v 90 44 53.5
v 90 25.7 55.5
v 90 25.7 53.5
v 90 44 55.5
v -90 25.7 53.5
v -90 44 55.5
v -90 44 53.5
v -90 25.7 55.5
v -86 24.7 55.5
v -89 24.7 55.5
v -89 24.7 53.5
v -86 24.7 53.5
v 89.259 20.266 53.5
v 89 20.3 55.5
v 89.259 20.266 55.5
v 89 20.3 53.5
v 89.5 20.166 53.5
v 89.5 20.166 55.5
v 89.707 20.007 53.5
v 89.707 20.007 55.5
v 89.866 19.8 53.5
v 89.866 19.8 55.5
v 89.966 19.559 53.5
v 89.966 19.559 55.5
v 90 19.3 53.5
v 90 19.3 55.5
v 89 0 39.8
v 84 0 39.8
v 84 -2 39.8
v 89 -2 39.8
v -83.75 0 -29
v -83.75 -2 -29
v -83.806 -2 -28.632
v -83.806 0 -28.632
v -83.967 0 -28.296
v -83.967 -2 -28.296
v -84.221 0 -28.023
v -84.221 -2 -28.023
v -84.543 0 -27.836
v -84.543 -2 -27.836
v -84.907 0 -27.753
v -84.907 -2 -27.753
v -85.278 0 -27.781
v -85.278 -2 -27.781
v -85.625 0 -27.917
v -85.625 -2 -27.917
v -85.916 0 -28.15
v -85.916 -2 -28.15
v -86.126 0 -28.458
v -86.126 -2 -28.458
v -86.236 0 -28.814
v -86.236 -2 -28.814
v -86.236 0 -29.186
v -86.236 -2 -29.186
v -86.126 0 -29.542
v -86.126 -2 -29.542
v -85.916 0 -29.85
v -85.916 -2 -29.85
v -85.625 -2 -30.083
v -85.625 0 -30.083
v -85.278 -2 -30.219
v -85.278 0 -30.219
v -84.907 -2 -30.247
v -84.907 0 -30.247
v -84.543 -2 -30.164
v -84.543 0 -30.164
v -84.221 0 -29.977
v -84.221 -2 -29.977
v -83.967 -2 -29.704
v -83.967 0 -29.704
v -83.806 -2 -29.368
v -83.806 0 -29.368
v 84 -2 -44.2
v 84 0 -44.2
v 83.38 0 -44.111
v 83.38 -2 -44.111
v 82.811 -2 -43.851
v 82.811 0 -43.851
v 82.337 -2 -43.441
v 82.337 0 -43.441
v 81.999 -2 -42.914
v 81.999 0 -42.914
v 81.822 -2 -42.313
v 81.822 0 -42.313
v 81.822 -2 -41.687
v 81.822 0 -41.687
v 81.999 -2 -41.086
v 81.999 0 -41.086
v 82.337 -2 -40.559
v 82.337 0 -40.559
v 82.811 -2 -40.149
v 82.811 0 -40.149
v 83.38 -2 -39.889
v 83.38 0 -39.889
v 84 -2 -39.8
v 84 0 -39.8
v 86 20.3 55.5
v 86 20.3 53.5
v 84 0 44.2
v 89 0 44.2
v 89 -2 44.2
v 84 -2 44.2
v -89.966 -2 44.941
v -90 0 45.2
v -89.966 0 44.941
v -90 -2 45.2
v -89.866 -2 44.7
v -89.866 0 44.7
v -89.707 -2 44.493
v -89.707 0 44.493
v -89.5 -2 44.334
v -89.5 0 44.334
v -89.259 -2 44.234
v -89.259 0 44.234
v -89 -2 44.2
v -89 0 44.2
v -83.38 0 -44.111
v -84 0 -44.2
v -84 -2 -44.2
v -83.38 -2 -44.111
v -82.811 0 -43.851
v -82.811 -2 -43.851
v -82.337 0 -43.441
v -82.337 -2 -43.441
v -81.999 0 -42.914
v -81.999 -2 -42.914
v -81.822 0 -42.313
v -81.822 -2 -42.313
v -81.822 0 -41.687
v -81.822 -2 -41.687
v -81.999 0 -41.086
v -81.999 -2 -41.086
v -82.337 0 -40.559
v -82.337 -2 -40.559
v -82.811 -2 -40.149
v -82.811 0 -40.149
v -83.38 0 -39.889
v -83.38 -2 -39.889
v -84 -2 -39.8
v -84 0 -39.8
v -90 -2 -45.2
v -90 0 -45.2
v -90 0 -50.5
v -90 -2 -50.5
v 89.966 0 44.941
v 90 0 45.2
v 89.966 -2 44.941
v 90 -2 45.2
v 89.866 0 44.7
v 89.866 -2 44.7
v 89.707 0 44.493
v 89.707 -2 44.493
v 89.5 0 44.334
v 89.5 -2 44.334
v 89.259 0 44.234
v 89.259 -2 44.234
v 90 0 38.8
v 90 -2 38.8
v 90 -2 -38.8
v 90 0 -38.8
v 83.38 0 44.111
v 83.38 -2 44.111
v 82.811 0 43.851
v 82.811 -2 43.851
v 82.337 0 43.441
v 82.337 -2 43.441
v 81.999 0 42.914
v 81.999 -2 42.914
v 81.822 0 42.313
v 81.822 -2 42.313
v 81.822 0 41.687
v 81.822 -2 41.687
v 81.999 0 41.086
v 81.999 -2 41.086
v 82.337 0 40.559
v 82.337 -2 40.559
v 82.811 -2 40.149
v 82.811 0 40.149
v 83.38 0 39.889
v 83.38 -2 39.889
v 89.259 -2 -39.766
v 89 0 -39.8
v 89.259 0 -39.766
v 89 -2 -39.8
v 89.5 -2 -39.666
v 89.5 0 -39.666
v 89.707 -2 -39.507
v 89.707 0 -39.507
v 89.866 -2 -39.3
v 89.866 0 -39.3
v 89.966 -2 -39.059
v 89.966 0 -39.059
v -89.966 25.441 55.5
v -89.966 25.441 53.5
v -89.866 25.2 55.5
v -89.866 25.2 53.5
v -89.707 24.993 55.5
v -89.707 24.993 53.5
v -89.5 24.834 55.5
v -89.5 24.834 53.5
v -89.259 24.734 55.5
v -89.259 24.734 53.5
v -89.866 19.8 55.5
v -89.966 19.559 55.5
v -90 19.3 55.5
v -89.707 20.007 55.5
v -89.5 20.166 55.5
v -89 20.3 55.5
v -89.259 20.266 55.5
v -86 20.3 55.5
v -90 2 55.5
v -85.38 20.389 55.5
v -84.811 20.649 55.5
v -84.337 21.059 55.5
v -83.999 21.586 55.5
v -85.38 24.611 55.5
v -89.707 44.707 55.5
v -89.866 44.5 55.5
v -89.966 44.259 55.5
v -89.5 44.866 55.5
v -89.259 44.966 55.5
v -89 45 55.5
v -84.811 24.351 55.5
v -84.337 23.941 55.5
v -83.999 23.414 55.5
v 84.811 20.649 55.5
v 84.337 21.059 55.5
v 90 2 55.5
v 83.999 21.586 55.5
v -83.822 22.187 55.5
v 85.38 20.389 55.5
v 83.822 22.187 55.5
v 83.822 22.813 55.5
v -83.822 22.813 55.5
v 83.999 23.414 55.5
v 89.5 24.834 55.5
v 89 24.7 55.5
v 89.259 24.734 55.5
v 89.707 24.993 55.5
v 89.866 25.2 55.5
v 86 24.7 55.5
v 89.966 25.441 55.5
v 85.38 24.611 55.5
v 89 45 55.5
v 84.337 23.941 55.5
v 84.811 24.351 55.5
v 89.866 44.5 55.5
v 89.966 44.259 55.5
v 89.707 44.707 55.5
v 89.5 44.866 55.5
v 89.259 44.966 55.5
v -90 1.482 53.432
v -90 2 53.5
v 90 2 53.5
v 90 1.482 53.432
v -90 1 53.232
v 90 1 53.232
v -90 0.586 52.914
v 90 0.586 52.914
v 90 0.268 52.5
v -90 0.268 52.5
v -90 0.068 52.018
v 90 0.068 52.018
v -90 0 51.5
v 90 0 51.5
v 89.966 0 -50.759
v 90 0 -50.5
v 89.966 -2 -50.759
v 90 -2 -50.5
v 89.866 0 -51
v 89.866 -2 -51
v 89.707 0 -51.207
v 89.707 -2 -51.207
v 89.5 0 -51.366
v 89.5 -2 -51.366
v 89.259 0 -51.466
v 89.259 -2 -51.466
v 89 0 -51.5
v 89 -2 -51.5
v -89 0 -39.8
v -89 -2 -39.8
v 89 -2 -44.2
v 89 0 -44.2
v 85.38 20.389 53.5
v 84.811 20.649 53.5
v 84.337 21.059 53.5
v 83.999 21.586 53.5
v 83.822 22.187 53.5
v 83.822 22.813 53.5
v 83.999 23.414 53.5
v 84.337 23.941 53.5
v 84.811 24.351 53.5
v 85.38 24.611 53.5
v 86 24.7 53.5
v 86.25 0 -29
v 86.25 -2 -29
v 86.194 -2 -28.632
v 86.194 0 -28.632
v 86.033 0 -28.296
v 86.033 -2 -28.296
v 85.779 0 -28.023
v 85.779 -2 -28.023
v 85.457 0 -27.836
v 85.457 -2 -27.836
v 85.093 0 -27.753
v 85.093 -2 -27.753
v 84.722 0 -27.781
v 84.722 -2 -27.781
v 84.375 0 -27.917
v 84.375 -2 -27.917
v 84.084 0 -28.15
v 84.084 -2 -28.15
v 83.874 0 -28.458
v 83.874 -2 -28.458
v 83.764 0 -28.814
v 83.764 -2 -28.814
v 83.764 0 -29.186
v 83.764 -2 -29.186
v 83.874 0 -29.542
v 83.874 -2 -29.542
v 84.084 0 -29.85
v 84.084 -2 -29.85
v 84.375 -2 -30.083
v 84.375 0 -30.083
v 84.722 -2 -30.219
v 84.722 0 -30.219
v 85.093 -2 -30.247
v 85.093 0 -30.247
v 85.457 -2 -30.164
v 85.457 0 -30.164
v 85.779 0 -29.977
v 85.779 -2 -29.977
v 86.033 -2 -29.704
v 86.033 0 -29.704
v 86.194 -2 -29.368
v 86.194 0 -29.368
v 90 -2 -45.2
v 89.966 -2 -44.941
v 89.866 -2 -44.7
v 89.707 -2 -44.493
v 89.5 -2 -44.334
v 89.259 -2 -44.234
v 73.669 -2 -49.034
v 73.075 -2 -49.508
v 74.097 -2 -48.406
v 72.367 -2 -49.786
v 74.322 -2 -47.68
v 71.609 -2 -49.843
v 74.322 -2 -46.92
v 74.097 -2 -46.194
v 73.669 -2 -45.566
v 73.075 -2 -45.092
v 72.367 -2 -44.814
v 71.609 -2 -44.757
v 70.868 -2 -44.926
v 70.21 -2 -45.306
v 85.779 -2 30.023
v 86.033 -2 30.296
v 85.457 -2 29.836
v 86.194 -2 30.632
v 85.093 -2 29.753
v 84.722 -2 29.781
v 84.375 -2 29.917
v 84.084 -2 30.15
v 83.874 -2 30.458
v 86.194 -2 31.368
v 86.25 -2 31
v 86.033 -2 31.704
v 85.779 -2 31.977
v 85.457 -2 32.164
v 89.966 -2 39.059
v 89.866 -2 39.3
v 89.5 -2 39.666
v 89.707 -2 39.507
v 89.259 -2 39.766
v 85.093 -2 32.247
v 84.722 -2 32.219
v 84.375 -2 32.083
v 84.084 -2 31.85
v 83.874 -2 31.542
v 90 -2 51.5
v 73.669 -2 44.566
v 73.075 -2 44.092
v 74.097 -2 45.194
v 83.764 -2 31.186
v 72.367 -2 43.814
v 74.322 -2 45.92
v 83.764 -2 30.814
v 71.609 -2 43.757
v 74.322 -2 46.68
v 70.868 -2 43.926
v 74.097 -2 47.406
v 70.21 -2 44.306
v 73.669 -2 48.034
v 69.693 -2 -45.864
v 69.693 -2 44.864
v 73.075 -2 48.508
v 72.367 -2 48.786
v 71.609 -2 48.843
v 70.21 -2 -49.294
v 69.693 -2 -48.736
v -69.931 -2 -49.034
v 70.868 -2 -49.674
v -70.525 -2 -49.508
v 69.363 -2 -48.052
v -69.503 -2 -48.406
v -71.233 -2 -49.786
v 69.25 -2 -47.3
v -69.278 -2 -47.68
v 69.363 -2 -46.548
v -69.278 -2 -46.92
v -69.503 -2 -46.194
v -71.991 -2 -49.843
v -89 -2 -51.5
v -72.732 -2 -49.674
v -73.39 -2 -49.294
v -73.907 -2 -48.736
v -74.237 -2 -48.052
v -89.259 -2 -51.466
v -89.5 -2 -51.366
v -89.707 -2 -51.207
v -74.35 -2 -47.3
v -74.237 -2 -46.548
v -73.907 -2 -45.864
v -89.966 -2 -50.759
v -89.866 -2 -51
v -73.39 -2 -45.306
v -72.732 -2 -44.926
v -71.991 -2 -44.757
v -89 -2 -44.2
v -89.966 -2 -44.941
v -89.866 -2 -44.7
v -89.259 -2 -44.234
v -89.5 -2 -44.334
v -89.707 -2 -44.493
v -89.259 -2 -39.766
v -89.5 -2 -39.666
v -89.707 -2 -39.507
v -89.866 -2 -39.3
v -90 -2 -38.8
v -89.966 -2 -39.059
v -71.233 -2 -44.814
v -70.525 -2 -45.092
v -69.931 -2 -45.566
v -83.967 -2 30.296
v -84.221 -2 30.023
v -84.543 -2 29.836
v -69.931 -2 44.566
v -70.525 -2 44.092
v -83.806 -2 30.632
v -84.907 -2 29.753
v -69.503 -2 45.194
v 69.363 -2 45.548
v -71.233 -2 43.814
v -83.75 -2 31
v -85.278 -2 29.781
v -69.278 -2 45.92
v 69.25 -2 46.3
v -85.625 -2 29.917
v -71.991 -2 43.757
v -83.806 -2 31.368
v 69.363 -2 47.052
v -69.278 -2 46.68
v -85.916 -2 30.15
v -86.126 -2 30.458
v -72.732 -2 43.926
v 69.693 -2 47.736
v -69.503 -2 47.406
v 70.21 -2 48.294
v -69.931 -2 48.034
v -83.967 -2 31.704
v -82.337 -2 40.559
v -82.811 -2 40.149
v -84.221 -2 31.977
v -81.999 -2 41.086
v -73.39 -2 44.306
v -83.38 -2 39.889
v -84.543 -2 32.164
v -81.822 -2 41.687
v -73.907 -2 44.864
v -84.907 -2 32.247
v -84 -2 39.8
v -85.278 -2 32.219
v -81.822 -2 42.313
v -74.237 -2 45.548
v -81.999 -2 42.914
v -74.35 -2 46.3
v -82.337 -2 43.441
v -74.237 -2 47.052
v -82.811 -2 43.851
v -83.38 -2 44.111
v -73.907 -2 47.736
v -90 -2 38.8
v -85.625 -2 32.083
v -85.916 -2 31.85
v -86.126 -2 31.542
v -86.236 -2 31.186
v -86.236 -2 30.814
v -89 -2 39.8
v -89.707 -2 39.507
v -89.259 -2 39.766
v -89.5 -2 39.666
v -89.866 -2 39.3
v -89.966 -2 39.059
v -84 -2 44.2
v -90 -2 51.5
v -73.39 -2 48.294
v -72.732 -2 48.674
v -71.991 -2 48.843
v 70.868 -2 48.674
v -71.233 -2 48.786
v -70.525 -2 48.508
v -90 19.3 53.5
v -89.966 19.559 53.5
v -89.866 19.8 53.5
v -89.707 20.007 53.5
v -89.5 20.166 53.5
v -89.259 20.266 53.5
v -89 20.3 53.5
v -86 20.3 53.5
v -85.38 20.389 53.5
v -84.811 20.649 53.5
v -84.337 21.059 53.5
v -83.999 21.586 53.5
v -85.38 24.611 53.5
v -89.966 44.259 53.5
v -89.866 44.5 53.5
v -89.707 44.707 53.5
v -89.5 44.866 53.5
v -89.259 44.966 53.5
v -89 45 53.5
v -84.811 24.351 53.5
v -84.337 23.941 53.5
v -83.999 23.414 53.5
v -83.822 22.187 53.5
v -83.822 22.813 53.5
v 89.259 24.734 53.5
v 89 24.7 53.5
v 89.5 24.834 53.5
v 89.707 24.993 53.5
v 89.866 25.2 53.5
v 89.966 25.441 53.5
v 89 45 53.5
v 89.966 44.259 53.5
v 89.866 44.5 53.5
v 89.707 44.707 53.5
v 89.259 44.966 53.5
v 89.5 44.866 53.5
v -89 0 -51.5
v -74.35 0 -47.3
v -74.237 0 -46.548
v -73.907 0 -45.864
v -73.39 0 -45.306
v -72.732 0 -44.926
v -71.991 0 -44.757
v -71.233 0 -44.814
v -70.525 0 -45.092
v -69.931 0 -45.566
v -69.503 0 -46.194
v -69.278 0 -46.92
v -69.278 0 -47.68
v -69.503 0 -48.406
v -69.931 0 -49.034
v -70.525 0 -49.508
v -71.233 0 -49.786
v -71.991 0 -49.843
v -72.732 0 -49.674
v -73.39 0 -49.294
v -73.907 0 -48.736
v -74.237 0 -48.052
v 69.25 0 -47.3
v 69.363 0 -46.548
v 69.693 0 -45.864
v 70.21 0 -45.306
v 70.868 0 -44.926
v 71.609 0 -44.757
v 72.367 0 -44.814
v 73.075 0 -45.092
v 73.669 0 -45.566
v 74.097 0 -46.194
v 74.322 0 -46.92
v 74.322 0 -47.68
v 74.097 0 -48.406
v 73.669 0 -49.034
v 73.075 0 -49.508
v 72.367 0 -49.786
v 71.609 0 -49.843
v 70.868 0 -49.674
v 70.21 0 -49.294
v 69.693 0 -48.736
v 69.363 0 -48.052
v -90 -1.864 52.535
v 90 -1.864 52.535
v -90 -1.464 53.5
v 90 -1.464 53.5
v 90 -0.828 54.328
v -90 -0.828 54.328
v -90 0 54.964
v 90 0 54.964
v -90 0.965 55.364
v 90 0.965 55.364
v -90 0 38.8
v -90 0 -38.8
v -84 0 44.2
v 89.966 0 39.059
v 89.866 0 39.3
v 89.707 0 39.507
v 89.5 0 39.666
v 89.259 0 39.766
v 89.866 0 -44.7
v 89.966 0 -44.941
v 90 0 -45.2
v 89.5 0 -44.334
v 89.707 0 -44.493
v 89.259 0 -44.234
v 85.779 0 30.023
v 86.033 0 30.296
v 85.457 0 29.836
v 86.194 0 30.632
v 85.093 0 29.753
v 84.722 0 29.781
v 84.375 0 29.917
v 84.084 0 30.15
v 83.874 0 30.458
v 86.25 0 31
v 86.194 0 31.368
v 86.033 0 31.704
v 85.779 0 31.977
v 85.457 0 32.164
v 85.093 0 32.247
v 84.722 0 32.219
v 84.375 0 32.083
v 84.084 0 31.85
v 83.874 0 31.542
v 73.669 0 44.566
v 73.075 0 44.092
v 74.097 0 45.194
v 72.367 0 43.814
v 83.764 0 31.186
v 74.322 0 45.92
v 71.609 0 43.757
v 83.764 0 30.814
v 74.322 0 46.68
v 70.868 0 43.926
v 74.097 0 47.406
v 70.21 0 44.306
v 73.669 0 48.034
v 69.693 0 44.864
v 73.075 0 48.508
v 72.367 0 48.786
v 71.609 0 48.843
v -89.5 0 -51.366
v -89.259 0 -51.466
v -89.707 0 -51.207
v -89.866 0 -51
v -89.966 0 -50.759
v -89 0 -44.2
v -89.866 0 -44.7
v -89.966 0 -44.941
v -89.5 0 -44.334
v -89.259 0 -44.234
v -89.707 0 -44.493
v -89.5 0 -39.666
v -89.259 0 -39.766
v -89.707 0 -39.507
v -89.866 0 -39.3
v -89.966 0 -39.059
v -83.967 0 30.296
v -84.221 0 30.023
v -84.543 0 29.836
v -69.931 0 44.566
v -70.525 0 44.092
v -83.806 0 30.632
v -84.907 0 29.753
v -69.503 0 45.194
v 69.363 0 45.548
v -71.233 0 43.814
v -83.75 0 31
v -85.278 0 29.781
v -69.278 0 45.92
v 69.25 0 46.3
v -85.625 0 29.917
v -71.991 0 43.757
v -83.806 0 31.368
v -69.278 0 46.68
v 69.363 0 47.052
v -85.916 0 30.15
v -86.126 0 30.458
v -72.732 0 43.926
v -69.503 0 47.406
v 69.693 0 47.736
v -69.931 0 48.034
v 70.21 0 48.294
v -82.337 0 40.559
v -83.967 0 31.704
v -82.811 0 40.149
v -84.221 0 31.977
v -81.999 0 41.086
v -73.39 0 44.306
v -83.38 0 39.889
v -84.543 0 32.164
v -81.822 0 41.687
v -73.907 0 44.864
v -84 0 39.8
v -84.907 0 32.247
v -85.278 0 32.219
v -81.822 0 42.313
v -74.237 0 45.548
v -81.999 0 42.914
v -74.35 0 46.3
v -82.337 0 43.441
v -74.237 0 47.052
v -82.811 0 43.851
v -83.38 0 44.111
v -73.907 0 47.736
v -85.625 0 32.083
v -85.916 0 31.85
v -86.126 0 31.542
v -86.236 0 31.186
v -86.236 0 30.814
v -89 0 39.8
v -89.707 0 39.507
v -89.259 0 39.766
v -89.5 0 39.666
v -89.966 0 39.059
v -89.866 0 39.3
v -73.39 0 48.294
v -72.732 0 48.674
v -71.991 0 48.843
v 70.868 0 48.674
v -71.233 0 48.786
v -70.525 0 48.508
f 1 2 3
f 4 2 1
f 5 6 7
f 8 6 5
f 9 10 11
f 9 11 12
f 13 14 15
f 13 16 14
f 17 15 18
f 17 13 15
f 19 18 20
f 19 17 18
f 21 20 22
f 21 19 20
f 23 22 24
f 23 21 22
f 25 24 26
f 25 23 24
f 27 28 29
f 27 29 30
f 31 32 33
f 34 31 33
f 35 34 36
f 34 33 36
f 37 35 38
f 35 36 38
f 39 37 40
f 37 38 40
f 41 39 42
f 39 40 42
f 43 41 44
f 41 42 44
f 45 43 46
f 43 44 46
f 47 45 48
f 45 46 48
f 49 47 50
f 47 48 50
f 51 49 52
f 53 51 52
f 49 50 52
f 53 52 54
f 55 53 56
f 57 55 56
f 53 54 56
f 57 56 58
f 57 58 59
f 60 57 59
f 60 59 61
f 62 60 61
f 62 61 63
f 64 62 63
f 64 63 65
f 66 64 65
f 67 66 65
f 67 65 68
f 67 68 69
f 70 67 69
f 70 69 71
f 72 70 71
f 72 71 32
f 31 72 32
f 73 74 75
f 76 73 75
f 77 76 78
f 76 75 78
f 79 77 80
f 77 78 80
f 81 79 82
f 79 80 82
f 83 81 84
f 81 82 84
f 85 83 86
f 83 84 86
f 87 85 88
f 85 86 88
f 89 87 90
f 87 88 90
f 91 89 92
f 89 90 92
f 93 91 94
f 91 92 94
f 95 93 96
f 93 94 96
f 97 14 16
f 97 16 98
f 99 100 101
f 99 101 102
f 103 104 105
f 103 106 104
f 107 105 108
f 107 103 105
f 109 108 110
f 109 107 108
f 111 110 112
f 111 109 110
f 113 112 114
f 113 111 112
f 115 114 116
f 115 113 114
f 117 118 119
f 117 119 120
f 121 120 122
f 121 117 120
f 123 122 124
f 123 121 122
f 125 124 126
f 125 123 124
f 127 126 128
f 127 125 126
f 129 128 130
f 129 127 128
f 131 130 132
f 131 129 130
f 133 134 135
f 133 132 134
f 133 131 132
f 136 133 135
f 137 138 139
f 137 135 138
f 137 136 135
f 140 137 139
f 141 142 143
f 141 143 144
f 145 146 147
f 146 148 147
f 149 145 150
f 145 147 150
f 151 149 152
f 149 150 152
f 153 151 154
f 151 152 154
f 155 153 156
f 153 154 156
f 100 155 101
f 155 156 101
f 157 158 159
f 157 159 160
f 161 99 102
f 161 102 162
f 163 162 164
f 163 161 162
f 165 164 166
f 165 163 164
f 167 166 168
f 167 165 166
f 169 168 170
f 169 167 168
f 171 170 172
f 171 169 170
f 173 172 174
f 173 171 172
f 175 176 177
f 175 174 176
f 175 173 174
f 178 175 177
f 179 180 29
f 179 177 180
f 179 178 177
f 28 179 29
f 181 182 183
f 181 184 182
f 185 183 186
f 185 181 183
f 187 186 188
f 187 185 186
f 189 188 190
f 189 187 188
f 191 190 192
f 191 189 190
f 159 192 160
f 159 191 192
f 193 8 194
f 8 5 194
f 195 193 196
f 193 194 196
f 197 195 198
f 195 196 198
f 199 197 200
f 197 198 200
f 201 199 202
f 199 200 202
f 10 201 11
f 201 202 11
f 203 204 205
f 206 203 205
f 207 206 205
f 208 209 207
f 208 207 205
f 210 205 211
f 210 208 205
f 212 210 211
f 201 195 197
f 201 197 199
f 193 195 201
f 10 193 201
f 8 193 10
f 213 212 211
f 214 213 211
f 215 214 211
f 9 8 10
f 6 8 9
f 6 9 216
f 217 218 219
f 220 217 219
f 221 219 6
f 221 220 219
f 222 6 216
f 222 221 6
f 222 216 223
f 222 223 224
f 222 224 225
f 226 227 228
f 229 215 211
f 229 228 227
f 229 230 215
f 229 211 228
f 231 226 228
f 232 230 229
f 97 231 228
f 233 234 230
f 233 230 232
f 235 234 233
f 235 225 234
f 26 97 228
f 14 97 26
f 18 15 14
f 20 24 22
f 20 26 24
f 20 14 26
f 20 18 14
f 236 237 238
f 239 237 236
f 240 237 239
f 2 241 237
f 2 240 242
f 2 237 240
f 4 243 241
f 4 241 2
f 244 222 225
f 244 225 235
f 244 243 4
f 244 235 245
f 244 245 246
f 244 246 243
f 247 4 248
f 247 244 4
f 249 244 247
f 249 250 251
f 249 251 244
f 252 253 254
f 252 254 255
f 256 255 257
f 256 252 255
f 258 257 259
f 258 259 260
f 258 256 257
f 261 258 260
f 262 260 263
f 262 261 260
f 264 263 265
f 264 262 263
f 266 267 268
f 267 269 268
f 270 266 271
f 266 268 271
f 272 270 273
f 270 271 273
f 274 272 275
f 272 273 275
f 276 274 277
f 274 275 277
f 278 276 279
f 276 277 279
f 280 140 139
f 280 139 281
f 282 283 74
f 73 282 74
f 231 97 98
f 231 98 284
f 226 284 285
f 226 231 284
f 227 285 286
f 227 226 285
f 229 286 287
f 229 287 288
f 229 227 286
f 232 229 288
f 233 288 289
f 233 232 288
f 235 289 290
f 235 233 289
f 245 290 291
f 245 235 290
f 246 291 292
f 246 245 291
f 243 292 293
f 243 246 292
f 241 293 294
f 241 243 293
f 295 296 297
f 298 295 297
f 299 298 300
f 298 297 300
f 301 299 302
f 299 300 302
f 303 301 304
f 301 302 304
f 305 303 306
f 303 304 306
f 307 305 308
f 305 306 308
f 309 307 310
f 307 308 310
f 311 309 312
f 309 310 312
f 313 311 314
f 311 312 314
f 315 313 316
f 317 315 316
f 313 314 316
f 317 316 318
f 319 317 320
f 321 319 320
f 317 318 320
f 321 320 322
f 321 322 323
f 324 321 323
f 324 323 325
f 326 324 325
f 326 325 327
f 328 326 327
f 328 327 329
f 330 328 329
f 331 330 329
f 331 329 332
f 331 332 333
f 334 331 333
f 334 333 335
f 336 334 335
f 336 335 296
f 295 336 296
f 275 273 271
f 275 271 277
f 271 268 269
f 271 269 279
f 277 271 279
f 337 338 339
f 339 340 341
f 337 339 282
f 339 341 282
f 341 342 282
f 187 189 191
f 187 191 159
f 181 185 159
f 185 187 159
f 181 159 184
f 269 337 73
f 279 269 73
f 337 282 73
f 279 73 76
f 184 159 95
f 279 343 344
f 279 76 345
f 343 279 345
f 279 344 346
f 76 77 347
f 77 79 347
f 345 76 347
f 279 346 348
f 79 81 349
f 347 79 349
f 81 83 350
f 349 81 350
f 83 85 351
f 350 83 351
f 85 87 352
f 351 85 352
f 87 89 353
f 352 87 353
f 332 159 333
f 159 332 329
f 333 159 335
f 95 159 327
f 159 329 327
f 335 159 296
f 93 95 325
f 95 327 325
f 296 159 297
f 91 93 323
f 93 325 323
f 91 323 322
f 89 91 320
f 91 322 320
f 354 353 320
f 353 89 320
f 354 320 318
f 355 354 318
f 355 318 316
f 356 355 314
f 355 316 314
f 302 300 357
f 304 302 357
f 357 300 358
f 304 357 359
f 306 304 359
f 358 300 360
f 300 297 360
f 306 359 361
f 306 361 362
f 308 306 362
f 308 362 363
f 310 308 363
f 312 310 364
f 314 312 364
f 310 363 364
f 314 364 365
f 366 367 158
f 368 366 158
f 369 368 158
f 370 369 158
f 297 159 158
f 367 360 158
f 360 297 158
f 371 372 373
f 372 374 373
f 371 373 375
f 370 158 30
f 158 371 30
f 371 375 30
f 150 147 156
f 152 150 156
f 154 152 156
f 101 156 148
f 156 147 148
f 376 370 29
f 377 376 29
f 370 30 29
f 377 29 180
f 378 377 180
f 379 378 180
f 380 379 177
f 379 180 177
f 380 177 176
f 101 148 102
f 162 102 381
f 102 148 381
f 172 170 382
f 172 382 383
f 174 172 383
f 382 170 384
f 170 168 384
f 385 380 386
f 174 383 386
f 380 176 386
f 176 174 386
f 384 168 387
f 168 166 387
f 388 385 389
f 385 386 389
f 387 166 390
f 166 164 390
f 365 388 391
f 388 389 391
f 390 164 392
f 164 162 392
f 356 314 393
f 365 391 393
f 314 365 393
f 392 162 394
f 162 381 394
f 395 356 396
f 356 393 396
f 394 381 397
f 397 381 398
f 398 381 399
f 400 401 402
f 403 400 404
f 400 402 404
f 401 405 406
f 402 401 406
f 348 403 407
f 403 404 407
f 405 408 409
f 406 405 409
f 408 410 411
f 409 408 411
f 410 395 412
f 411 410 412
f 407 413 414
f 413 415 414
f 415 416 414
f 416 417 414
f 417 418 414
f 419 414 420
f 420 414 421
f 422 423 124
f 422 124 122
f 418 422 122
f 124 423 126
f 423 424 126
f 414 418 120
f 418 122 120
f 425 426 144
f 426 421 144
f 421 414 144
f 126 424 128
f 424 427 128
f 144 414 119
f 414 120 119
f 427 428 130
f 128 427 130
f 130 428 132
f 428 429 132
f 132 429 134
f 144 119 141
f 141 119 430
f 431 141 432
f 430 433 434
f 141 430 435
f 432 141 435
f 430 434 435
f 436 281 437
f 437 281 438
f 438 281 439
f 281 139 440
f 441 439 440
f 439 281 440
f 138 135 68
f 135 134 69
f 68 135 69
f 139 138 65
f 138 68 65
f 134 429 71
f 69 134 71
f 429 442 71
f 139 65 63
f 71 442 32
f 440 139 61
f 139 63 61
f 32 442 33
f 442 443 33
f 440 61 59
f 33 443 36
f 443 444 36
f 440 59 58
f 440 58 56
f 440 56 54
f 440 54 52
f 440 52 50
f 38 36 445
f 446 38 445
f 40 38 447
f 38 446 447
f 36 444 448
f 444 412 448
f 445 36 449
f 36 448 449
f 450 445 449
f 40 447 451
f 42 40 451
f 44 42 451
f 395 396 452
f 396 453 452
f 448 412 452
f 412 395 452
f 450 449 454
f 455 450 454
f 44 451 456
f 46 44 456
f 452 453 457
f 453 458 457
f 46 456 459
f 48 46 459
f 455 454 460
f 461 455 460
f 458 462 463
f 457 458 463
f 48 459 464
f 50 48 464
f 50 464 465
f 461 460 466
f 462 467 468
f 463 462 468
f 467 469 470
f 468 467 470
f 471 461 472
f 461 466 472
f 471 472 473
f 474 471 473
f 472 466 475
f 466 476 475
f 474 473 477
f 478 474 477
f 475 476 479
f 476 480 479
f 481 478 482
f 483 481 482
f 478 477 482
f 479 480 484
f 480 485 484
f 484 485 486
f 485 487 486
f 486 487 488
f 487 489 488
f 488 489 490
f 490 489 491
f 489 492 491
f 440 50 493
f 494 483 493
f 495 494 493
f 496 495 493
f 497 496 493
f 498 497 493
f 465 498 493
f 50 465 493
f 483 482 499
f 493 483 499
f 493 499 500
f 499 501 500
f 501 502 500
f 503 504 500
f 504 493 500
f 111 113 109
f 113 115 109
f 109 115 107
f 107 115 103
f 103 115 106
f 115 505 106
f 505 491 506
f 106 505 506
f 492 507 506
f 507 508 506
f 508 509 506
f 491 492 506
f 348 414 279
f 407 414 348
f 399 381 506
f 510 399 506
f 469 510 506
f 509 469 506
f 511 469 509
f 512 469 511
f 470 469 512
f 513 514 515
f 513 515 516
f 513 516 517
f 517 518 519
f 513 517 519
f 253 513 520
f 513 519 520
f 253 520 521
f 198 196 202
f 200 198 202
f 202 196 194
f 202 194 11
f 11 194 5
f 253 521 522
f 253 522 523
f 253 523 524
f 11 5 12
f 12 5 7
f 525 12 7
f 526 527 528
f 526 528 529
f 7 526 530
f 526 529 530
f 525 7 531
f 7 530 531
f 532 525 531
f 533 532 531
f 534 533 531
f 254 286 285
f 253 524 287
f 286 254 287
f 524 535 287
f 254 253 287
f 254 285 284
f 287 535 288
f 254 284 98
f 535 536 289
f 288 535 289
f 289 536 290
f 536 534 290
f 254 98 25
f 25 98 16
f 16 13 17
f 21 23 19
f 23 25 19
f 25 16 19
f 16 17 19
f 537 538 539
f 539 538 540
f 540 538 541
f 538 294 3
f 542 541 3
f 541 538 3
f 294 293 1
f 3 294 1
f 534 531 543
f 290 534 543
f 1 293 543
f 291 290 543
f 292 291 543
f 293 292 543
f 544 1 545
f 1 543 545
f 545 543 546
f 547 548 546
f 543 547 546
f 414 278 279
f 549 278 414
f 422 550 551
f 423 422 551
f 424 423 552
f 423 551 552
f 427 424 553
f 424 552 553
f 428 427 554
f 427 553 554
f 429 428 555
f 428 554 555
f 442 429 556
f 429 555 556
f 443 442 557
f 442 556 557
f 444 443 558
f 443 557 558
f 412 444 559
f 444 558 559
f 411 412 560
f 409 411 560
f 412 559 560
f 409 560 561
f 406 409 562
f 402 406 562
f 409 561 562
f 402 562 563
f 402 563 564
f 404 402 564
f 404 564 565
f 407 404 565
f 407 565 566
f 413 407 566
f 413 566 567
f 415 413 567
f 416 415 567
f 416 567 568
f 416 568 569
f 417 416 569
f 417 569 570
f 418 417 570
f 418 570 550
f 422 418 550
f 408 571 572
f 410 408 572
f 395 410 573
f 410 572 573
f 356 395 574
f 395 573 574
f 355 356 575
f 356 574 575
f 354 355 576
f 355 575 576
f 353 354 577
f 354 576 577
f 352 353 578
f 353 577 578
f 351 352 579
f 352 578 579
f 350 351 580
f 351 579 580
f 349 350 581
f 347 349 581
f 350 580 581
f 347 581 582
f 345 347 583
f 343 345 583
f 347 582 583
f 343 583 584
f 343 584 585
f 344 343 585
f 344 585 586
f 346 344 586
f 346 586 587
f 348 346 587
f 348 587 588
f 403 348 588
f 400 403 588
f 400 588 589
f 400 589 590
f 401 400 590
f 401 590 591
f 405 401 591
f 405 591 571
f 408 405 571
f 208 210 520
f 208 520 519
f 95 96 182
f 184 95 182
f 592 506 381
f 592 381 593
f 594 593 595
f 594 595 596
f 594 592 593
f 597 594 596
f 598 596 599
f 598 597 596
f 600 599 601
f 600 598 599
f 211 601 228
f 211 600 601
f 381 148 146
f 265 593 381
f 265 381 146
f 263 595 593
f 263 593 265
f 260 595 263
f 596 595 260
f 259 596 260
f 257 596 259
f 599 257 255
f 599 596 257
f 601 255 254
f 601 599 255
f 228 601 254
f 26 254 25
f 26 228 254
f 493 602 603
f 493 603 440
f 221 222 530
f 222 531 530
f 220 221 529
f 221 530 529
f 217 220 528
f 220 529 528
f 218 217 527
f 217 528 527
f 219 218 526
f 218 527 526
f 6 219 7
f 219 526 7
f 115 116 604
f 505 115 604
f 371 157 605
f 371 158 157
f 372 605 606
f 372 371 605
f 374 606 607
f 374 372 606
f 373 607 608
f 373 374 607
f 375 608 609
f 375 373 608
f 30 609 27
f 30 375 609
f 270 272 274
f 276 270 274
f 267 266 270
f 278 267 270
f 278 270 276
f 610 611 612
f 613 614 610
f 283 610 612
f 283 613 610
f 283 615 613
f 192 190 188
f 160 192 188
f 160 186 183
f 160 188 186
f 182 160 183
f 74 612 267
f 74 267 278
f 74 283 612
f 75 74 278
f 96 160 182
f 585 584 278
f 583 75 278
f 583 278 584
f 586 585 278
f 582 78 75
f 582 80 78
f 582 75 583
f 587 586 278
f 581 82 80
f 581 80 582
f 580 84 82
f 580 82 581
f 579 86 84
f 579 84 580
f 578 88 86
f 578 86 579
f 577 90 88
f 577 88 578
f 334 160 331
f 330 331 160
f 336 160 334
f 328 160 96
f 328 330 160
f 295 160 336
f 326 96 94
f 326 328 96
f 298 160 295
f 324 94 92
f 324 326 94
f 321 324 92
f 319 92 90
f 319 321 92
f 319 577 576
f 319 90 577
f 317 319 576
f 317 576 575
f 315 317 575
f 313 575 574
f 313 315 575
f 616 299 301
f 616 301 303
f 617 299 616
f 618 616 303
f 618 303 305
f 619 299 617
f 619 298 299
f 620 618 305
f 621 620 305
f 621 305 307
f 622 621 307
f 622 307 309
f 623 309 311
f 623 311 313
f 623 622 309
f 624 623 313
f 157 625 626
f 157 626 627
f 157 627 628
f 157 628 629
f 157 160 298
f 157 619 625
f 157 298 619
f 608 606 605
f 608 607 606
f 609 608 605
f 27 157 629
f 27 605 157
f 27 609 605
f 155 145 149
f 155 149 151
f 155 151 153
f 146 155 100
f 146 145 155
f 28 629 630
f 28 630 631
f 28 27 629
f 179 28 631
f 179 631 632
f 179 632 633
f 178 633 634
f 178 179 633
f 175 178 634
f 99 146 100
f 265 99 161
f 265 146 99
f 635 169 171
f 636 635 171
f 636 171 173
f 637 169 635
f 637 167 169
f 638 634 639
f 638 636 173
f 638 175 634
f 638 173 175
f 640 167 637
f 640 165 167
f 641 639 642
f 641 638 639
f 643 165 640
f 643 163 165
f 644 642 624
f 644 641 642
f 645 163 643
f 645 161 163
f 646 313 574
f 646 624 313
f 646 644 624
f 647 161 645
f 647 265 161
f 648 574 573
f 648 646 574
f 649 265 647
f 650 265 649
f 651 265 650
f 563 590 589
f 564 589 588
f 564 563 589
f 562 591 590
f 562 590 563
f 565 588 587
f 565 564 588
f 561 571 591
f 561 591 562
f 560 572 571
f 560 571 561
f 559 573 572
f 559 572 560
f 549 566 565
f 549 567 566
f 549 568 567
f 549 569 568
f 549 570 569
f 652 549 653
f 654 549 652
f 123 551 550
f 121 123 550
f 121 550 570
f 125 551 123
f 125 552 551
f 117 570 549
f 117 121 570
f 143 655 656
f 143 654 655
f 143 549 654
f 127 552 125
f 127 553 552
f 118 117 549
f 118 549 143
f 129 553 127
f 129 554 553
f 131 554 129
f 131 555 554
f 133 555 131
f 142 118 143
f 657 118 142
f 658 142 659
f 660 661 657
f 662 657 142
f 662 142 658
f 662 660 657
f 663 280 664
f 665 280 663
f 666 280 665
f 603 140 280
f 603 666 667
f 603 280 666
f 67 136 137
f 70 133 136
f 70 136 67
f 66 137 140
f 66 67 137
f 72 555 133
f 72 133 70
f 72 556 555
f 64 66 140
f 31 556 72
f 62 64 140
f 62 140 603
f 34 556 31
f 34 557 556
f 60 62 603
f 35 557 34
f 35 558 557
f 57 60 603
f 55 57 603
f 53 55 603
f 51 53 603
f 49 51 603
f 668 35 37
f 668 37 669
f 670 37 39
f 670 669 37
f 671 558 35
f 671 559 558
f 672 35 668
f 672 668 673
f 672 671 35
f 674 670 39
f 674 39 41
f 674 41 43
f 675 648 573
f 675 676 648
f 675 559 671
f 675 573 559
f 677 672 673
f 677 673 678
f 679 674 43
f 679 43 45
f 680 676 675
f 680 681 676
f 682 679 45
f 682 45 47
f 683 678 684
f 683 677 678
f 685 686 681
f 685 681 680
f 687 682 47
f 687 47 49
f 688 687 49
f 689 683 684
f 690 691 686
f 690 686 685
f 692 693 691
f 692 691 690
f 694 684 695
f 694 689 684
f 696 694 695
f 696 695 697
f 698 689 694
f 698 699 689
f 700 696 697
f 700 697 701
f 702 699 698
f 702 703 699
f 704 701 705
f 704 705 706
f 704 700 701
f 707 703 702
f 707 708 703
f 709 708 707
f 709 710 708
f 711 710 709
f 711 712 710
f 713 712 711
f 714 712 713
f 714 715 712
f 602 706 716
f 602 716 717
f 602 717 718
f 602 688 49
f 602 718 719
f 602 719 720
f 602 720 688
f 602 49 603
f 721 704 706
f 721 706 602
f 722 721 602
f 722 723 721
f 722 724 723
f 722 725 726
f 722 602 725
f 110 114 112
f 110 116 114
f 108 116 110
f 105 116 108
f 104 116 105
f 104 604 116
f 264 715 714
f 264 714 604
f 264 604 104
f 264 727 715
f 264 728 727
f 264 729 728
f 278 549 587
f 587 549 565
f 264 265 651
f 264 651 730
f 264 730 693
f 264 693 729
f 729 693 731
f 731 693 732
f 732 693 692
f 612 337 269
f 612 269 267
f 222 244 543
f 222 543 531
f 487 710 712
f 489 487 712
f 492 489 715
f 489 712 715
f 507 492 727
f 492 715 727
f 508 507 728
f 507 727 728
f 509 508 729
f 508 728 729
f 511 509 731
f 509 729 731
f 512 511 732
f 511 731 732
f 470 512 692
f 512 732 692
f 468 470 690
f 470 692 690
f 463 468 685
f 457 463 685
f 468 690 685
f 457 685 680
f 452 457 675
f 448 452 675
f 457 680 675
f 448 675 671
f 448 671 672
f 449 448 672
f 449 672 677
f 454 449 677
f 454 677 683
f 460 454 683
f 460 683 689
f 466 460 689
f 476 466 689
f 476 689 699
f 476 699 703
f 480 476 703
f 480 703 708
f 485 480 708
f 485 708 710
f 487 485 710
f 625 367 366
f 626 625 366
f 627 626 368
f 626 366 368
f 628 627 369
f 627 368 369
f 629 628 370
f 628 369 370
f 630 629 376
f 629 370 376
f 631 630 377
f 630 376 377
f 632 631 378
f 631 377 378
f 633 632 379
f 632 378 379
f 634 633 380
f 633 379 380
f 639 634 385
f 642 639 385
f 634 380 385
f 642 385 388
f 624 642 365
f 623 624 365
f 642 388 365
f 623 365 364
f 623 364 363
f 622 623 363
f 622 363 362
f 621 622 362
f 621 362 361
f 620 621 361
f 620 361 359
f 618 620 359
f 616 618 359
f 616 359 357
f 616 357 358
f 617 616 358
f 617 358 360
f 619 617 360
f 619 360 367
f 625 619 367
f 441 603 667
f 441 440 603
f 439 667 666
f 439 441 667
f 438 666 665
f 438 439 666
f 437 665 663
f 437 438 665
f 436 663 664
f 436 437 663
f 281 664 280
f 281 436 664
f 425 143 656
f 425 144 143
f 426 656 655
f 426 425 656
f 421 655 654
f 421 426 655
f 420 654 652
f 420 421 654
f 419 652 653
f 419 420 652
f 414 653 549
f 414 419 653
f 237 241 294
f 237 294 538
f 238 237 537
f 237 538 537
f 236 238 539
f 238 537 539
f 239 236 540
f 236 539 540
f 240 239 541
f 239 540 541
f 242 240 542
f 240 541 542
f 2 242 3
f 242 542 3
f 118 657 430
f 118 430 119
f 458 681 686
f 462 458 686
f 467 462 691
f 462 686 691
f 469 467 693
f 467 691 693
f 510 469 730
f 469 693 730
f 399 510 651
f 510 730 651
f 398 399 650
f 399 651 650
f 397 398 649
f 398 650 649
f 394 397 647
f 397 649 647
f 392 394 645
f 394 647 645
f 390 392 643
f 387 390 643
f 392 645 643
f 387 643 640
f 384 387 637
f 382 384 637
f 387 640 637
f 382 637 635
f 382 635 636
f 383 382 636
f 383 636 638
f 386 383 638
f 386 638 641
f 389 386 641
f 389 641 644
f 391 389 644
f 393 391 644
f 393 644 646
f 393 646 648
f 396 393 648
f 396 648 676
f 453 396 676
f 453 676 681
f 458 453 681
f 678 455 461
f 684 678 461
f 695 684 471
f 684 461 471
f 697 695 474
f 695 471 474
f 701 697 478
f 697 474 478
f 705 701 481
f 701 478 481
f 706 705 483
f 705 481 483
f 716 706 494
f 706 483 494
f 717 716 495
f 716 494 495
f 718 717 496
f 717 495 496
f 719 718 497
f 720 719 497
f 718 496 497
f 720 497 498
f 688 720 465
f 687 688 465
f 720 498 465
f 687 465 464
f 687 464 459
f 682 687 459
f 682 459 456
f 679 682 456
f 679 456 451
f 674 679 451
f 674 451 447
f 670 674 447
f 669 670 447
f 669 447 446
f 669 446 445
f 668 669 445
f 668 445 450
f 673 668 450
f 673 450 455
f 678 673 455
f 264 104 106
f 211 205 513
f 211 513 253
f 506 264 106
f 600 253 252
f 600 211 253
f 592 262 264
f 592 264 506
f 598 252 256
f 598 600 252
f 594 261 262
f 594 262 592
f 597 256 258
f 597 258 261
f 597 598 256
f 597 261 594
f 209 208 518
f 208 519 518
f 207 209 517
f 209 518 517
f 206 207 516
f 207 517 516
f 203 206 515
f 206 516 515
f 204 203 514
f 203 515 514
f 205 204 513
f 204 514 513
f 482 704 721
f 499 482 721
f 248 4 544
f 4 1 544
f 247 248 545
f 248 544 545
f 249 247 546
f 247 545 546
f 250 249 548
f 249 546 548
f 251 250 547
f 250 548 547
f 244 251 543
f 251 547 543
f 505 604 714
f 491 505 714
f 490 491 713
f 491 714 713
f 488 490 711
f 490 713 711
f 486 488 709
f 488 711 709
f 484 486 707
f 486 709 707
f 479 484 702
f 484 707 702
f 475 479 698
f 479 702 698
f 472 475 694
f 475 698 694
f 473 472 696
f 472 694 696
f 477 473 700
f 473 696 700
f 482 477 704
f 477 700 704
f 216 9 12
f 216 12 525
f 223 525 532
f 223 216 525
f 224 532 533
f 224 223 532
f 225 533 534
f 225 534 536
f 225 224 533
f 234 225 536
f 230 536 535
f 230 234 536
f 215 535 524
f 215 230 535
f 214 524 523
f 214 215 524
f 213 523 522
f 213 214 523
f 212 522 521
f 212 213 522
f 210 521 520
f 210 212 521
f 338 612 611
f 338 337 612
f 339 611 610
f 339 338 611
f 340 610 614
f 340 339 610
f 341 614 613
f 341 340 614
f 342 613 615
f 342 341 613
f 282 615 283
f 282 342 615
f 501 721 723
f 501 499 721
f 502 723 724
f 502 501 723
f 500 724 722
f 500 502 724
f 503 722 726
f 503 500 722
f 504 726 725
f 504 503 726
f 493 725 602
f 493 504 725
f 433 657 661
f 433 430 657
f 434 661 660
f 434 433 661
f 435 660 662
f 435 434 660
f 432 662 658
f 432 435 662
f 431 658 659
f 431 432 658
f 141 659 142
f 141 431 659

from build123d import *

# Parameters (mm, degrees)
SKETCH1_W                  = 180
SKETCH1_H                  = 103
BASE_FLANGE1_DEPTH         = 2
EDGE_FLANGE1_DEPTH         = 180
EDGE_FLANGE1_START         = 2
EDGE_FLANGE1_FLAT_DEPTH    = 2
F_5_1_5_1_DIAMETER_HOLE1_D = 5.1
LPATTERN1_COUNT            = 2
LPATTERN1_PITCH            = 143.6
LPATTERN1_COUNT_DIR2       = 2
LPATTERN1_PITCH_DIR2       = 93.6
M3_TAPPED_HOLE1_D          = 2.5
CUT_EXTRUDE1_DEPTH         = 115.914098352
FILLET1_R                  = 1
BODY_MOVE_COPY1_ANGLE      = 180


# Sheet-metal steps are written as plain solids
with BuildPart() as part:
    # Sketch1 → Base-Flange1 (new body)
    with BuildSketch(Plane(origin=(0, 0, 0), x_dir=(1, 0, 0), z_dir=(0, 1, 0))):
        Rectangle(SKETCH1_W, SKETCH1_H)
    extrude(amount=-BASE_FLANGE1_DEPTH)

    # Edge-Flange1 bend section (across the edge) → Edge-Flange1 (add)
    with BuildSketch(Plane(origin=(90, 0, -53.5), x_dir=(0, 0, 1), z_dir=(-1, 0, 0))):
        with BuildLine():
            Line((-2, 2), (0, 2))
            ThreePointArc((0, 2), (0.585786438, 0.585786438), (2, 0))
            Line((2, 0), (2, -2))
            ThreePointArc((2, -2), (-0.828427125, -0.828427125), (-2, 2))
        make_face()
    extrude(amount=EDGE_FLANGE1_DEPTH)

    # Edge-Flange1 profile (on flange) → Edge-Flange1 flat (add)
    with BuildSketch(Plane(origin=(0, 0, -53.5), x_dir=(-1, 0, 0), z_dir=(0, 0, -1)).offset(EDGE_FLANGE1_START)):
        with BuildLine():
            ThreePointArc((86, 20.3), (83.8, 22.5), (86, 24.7))
            Line((86, 24.7), (90, 24.7))
            Line((90, 24.7), (90, 45))
            Line((90, 45), (-90, 45))
            Line((-90, 45), (-90, 24.7))
            Line((-90, 24.7), (-86, 24.7))
            ThreePointArc((-86, 24.7), (-83.8, 22.5), (-86, 20.3))
            Line((-86, 20.3), (-90, 20.3))
            Line((-90, 20.3), (-90, 2))
            Line((-90, 2), (90, 2))
            Line((90, 2), (90, 20.3))
            Line((90, 20.3), (86, 20.3))
        make_face()
    extrude(amount=-EDGE_FLANGE1_FLAT_DEPTH)

    # Ø5.1 (5.1) Diameter Hole1 (through all)
    with Locations(Plane(origin=(0, -2, 0), x_dir=(-1, 0, 0), z_dir=(0, -1, 0))):
        with Locations((-71.8, -47.3)):
            f_5_1_5_1_diameter_hole1 = Hole(F_5_1_5_1_DIAMETER_HOLE1_D / 2)

    # LPattern1: 5.1 _5.1_ Diameter Hole1 2 × 2
    with Locations(*[(-i * LPATTERN1_PITCH, 0, -j * LPATTERN1_PITCH_DIR2) for i in range(LPATTERN1_COUNT) for j in range(LPATTERN1_COUNT_DIR2) if (i, j) != (0, 0)]):
        add(f_5_1_5_1_diameter_hole1, mode=Mode.SUBTRACT)

    # M3 Tapped Hole1 (through all)
    with Locations(Plane(origin=(0, 0, 0), x_dir=(1, 0, 0), z_dir=(0, 1, 0))):
        with Locations((-85, -29), (85, -29), (-85, 31), (85, 31)):
            Hole(M3_TAPPED_HOLE1_D / 2)

    # Sketch13 → Cut-Extrude1 (cut, through all)
    with BuildSketch(Plane(origin=(0, 0, 0), x_dir=(1, 0, 0), z_dir=(0, 1, 0))):
        with BuildLine():
            Line((-90, 44.2), (-84, 44.2))
            ThreePointArc((-84, 44.2), (-81.8, 42), (-84, 39.8))
            Line((-84, 39.8), (-90, 39.8))
            Line((-90, 39.8), (-90, 44.2))
        make_face()
        with BuildLine():
            Line((-90, -39.8), (-90, -44.2))
            Line((-90, -44.2), (-84, -44.2))
            ThreePointArc((-84, -44.2), (-81.8, -42), (-84, -39.8))
            Line((-84, -39.8), (-90, -39.8))
        make_face()
        with BuildLine():
            Line((90, -44.2), (84, -44.2))
            ThreePointArc((84, -44.2), (81.8, -42), (84, -39.8))
            Line((84, -39.8), (90, -39.8))
            Line((90, -39.8), (90, -44.2))
        make_face()
        with BuildLine():
            Line((90, 39.8), (90, 44.2))
            Line((90, 44.2), (84, 44.2))
            ThreePointArc((84, 44.2), (81.8, 42), (84, 39.8))
            Line((84, 39.8), (90, 39.8))
        make_face()
    extrude(amount=-CUT_EXTRUDE1_DEPTH, mode=Mode.SUBTRACT)

    # Fillet1
    fillet1_edges = [part.edges().sort_by_distance(p)[0] for p in [
        (90, -1, -44.2),
        (90, -1, -39.8),
        (90, -1, 39.8),
        (90, -1, 44.2),
        (-90, -1, 44.2),
        (-90, -1, 39.8),
        (-90, -1, -39.8),
        (-90, -1, -44.2),
        (90, 20.3, -54.5),
        (-90, 20.3, -54.5),
        (-90, 24.7, -54.5),
        (-90, 45, -54.5),
        (90, 45, -54.5),
        (90, 24.7, -54.5),
        (90, -1, 51.5),
        (-90, -1, 51.5),
    ]]
    fillet(fillet1_edges, radius=FILLET1_R)


with BuildPart() as part_1:
    # Body-Move/Copy1: moved
    add(part.part.rotate(Axis((0, 0, 0), (0, 1, 0)), BODY_MOVE_COPY1_ANGLE))


solid = part_1.part
